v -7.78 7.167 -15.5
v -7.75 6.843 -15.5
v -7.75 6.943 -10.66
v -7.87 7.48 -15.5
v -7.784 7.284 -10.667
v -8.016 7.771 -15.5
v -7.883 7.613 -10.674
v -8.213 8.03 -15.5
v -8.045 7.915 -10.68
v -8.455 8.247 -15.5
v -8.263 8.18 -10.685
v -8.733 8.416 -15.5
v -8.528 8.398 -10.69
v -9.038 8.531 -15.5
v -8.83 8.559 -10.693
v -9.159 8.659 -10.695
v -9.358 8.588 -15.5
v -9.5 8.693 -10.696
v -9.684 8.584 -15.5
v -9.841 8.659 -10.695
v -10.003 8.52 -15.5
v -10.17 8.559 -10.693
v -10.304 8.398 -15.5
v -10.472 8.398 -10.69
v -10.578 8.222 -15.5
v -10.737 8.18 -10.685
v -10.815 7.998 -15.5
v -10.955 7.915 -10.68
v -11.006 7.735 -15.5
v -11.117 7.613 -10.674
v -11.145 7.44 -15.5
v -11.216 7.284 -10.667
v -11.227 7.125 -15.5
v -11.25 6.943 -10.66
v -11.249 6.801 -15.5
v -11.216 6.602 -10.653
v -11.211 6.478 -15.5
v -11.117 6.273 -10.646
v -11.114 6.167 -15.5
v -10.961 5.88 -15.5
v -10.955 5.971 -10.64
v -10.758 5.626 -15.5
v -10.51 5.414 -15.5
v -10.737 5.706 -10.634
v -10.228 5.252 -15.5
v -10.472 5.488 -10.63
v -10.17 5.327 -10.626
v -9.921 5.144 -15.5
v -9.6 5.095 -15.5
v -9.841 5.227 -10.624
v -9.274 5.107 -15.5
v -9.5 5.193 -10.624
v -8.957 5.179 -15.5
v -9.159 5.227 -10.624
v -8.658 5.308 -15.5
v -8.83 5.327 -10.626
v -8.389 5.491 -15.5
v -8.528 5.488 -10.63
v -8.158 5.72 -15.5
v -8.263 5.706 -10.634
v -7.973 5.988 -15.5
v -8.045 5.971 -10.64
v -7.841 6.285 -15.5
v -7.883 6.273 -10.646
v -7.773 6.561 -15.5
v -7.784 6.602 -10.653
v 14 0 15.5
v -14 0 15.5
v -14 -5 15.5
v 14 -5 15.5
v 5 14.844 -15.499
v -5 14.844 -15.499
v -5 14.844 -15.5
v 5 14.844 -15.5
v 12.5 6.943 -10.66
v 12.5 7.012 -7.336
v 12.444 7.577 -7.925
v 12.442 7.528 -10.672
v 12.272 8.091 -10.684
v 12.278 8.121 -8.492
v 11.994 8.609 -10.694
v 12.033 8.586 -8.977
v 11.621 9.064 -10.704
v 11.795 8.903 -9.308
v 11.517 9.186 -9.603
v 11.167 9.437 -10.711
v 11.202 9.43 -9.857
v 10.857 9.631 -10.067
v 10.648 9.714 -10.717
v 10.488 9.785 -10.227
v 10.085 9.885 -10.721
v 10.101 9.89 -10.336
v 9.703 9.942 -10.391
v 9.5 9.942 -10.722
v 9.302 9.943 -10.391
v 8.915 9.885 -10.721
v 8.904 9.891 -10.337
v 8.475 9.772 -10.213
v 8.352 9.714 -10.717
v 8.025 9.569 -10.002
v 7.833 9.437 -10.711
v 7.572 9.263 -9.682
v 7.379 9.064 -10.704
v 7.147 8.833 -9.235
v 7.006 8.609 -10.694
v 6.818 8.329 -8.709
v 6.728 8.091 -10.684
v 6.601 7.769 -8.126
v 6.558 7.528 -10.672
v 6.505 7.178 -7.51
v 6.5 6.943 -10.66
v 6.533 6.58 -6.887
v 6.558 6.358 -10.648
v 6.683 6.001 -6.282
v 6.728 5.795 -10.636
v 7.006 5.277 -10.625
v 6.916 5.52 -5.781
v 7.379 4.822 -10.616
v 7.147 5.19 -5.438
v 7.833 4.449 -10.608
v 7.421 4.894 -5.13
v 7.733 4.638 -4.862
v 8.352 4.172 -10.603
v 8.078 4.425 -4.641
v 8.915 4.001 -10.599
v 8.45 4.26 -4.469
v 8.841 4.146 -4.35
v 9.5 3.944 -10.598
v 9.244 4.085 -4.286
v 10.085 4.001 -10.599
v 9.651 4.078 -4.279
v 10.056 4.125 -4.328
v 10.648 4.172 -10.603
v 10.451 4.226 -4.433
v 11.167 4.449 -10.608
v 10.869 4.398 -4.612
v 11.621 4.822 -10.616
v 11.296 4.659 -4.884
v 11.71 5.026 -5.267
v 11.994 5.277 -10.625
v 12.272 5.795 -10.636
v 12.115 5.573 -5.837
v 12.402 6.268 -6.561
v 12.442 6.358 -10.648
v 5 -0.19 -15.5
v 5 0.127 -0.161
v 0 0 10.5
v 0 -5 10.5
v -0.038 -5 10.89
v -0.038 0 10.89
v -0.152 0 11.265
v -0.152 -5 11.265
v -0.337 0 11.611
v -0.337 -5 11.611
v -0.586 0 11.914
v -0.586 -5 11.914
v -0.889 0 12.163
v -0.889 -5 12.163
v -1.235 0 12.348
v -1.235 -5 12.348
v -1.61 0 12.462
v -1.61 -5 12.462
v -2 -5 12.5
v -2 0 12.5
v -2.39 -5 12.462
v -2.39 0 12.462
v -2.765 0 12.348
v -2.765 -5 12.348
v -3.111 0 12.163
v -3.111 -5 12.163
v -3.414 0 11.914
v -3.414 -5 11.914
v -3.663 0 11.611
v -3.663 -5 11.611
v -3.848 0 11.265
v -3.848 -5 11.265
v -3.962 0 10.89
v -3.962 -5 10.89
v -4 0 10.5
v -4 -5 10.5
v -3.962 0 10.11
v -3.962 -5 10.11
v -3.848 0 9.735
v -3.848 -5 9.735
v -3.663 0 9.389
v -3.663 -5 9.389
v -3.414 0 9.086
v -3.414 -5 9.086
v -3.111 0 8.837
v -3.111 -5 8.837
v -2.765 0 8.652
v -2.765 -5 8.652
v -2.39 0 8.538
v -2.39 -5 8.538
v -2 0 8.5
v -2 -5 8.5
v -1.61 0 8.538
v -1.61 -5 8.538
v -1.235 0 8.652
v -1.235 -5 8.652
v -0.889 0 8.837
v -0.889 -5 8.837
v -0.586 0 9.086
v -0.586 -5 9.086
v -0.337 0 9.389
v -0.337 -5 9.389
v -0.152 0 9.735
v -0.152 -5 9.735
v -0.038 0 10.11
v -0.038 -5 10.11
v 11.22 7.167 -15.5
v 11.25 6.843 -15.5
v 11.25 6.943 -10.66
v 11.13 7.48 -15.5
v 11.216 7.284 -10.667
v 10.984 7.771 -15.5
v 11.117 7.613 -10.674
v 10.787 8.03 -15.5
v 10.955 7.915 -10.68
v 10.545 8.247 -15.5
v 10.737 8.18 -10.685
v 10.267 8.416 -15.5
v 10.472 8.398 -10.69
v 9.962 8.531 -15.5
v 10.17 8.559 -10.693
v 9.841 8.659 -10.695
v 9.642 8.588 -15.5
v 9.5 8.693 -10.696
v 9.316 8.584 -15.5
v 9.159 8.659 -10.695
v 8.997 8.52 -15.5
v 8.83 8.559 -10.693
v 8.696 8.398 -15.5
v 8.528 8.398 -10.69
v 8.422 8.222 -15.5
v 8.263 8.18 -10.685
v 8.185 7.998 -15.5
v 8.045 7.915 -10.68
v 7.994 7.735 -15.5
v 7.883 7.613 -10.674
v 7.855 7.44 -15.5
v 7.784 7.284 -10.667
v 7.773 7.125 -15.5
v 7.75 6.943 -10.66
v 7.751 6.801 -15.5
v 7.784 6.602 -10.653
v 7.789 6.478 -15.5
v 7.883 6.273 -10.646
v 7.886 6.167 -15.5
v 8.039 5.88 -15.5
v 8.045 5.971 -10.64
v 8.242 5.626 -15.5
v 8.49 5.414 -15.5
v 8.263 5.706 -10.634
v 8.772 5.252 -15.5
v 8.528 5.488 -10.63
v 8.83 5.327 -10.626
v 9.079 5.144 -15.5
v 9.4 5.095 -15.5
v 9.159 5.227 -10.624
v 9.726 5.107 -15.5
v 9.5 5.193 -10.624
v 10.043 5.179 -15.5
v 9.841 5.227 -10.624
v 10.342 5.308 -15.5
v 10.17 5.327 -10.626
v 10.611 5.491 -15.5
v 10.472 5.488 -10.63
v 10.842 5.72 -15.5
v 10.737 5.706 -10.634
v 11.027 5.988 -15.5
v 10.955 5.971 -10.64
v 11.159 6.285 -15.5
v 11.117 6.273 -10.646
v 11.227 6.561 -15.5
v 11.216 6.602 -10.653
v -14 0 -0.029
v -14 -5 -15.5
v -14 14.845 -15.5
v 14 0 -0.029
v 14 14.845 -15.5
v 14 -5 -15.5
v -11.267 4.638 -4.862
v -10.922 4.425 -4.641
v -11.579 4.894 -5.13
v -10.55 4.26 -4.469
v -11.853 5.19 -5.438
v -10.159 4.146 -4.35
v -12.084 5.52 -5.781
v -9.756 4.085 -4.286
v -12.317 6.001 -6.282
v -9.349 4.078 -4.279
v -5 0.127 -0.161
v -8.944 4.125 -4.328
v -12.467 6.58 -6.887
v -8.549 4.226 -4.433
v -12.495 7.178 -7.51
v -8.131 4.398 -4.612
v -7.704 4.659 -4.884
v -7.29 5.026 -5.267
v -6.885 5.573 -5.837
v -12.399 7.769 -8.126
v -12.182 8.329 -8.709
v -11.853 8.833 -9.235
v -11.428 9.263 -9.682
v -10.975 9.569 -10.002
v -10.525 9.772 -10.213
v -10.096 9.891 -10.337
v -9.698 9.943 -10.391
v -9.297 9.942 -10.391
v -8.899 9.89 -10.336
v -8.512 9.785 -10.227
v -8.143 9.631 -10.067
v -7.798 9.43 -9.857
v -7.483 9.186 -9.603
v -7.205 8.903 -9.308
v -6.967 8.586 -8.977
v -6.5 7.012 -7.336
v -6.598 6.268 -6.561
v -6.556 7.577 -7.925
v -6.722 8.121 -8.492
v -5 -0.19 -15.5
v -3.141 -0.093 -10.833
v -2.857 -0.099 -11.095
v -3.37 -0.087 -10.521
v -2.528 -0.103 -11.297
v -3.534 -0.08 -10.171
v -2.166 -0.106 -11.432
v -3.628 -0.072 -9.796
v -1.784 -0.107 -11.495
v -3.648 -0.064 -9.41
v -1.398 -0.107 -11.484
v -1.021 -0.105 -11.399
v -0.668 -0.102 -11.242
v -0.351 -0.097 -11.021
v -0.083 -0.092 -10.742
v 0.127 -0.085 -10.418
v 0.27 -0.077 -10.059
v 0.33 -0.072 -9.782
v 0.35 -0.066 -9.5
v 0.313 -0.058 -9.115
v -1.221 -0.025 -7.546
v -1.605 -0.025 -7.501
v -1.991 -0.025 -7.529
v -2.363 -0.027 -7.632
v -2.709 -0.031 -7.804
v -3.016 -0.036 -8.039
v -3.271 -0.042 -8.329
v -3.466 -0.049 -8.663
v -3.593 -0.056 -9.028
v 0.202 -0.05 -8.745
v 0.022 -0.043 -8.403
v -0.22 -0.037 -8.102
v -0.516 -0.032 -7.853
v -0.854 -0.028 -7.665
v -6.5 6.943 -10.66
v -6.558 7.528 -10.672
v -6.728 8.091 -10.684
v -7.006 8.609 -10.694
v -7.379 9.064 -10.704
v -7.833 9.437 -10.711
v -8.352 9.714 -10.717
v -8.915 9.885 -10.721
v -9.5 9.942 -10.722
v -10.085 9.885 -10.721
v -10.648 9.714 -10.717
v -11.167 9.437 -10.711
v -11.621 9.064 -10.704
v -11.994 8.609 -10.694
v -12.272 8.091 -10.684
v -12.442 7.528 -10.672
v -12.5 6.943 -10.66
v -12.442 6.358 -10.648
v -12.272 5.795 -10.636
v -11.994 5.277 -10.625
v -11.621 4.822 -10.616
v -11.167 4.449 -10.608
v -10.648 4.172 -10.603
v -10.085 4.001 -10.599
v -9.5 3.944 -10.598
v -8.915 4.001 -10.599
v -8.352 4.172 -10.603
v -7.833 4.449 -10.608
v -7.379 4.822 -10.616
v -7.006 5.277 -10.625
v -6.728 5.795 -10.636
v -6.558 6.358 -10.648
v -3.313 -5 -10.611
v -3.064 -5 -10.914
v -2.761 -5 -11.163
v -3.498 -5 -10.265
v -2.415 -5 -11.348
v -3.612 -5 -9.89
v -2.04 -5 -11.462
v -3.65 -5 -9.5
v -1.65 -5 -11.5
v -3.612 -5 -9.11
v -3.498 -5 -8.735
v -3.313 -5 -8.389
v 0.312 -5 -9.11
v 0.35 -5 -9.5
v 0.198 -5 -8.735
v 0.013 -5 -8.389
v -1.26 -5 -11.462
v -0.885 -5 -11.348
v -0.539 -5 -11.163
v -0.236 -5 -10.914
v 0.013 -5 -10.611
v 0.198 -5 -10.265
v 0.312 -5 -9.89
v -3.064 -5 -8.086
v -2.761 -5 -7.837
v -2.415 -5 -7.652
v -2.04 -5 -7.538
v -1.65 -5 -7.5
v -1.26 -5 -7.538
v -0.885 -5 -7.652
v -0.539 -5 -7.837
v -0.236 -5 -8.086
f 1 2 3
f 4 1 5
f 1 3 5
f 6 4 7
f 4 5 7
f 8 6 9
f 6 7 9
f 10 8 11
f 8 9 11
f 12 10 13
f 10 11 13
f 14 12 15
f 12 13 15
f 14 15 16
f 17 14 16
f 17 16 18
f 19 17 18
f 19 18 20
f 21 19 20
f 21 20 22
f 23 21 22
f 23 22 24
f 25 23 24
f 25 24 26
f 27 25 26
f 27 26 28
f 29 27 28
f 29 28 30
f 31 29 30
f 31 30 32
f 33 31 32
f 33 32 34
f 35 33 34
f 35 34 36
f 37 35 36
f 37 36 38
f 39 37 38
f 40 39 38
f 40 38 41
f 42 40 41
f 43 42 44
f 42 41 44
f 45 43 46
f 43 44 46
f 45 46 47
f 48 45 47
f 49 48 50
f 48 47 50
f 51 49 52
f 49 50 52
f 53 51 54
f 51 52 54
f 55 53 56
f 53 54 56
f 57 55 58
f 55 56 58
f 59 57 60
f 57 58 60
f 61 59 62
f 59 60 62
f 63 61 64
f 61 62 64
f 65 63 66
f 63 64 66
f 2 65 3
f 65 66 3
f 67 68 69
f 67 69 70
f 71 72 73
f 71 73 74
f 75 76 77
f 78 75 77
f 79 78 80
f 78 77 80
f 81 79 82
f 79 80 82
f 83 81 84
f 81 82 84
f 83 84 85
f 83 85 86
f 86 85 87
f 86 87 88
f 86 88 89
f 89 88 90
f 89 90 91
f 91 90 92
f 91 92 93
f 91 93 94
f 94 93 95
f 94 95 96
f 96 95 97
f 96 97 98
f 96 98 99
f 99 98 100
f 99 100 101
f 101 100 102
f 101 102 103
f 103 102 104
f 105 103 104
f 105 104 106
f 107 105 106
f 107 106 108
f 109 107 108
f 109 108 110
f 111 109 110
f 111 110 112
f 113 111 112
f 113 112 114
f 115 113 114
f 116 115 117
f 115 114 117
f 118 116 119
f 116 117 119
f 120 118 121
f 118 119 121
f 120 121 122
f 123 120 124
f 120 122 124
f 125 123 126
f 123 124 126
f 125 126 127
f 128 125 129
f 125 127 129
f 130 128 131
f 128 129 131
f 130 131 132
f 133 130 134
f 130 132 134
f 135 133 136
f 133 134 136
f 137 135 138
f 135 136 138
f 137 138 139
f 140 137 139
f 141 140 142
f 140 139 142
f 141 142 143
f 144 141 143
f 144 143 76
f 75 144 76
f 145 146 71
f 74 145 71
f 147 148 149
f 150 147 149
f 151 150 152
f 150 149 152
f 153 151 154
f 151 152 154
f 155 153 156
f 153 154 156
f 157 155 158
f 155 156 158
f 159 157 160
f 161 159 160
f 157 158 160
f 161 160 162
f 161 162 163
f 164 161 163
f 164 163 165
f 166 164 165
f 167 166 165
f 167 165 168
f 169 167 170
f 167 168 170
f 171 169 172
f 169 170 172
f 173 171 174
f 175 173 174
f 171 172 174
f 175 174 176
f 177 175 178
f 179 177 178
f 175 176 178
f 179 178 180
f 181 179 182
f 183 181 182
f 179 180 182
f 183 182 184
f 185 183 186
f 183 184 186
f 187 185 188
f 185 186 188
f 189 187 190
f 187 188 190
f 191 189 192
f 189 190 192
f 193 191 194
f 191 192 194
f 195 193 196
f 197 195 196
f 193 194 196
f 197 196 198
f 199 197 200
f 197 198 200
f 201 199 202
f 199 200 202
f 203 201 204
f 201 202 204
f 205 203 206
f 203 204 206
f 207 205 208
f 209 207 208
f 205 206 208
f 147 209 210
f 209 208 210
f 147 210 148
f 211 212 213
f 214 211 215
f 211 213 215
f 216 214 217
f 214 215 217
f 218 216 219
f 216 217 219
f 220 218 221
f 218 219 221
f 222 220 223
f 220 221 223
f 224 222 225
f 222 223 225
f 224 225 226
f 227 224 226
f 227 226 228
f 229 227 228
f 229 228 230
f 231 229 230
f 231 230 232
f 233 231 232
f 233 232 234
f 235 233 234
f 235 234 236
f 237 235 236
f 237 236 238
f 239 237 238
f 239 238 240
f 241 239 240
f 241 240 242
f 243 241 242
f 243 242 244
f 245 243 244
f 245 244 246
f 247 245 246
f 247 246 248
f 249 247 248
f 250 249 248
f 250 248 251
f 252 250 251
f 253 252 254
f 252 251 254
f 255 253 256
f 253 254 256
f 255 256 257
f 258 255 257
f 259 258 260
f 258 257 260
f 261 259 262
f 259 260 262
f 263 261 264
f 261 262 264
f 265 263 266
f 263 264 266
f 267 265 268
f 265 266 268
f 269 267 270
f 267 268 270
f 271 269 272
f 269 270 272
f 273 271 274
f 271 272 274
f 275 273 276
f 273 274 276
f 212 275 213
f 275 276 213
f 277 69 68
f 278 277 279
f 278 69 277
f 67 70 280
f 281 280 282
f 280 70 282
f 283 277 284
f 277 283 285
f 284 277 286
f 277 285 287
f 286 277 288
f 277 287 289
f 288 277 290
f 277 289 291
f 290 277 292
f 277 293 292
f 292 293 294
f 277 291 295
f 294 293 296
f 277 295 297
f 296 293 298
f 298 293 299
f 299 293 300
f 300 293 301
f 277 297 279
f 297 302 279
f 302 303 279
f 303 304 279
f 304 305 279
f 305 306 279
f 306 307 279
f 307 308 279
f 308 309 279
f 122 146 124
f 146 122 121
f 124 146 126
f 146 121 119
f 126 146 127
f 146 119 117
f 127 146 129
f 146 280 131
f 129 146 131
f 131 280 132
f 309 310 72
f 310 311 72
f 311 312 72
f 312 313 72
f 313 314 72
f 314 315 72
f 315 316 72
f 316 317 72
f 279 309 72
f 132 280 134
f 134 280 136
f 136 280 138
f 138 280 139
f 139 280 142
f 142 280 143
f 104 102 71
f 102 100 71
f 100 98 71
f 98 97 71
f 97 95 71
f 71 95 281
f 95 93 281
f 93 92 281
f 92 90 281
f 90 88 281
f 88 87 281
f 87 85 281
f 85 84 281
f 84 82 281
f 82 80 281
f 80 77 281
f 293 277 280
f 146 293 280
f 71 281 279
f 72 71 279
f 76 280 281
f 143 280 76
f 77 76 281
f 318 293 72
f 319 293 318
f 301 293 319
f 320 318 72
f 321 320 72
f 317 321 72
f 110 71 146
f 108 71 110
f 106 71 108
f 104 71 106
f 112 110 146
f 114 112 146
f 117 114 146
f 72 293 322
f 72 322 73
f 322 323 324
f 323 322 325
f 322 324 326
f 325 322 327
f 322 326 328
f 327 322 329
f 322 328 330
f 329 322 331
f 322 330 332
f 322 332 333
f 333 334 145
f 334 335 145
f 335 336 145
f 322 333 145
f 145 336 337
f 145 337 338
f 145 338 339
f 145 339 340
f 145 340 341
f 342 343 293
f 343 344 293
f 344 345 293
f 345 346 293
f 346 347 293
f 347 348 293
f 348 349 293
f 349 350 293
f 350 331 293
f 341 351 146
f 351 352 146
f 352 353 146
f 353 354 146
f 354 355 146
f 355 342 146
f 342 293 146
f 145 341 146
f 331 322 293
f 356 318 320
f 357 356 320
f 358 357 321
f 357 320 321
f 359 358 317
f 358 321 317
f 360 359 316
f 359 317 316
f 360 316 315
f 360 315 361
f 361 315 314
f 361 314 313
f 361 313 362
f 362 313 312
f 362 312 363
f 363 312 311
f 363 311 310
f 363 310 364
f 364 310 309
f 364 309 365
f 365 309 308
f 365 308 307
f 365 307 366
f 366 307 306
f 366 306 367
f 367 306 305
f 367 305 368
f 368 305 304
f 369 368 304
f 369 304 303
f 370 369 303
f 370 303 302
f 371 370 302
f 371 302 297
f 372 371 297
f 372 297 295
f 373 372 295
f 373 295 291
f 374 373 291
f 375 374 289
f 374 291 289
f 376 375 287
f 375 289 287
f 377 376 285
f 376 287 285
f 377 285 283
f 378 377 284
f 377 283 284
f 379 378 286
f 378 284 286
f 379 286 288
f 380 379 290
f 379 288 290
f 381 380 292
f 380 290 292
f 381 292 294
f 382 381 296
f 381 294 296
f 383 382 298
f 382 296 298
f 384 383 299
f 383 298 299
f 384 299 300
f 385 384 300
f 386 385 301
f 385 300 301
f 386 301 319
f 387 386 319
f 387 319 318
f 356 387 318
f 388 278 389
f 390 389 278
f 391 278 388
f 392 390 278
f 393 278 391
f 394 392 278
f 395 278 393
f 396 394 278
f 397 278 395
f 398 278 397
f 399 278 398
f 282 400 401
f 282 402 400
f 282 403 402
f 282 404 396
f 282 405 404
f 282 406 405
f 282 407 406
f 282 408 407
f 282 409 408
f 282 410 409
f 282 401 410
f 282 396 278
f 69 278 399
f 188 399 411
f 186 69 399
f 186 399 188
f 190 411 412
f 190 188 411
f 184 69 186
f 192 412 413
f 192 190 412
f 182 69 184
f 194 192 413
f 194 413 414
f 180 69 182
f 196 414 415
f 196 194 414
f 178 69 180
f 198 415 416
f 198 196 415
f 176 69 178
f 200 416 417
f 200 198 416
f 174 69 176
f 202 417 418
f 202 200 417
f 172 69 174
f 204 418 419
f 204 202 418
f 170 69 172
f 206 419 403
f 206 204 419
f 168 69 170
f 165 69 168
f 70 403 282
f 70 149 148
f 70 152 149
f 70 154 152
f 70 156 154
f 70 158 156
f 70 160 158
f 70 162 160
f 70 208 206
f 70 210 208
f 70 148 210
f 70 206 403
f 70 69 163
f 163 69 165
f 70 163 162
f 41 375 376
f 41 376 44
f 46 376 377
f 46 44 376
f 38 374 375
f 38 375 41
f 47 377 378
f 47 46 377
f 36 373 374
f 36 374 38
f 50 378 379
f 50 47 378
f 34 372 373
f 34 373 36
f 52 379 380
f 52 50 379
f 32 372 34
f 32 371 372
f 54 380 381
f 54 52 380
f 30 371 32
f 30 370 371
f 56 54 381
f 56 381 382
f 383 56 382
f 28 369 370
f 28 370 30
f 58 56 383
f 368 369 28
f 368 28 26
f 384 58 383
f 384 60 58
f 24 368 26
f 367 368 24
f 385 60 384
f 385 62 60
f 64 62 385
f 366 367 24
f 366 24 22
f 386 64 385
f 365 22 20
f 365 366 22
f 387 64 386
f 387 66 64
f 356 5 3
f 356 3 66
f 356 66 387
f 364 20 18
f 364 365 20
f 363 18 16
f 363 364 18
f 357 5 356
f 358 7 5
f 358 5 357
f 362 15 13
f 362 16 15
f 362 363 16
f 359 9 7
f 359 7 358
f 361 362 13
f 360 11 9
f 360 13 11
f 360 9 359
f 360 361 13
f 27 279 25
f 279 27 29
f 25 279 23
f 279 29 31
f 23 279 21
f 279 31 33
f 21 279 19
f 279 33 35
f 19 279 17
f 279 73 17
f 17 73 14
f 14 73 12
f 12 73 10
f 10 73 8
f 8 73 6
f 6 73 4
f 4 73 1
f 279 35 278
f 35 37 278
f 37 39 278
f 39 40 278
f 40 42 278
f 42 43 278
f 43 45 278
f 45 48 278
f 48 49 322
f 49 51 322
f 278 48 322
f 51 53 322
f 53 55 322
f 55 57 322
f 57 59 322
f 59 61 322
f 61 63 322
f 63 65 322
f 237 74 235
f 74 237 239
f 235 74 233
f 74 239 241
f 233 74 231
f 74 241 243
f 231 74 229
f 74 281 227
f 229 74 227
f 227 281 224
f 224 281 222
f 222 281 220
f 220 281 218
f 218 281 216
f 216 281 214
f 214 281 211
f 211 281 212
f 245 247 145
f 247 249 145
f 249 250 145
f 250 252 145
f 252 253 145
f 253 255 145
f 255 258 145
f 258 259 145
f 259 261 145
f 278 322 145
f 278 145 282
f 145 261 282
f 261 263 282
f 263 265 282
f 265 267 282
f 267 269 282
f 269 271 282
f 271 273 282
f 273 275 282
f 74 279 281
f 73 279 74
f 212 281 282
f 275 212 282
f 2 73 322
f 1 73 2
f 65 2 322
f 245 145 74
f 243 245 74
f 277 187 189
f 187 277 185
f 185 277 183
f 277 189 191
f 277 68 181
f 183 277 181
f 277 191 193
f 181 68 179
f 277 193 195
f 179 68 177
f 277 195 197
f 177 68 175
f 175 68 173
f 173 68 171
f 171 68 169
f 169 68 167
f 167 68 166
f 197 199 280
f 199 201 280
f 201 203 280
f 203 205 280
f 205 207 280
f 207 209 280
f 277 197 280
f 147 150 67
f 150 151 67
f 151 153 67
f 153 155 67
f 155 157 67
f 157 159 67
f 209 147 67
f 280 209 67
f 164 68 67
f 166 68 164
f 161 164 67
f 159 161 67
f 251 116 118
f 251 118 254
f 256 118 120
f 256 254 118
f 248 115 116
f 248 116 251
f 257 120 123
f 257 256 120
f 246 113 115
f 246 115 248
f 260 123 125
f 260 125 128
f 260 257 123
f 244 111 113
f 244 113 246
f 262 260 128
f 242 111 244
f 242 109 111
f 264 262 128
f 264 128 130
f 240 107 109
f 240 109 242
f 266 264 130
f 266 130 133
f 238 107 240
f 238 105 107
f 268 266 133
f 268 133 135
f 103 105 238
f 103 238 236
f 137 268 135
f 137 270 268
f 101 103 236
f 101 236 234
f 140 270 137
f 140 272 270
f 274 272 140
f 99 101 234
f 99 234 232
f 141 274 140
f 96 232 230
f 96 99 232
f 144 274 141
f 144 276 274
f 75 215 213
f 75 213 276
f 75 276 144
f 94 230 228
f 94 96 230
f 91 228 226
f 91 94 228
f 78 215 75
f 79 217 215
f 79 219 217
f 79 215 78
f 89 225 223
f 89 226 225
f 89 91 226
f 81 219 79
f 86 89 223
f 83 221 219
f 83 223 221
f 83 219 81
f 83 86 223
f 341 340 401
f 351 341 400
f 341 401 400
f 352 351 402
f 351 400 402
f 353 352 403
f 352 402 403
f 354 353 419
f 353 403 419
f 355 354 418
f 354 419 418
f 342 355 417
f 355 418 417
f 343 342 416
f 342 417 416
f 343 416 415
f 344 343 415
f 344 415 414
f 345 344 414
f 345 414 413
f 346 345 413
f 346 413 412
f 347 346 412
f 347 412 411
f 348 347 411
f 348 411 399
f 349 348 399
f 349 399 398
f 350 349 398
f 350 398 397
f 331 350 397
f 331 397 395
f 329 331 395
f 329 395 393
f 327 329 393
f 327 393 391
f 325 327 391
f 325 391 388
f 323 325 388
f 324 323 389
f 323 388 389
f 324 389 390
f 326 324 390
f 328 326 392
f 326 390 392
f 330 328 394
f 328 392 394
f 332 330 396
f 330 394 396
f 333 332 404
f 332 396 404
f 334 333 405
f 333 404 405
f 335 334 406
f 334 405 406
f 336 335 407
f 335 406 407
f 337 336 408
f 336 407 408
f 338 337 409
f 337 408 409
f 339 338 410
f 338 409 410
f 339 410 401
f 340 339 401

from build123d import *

# Parameters (mm, degrees)
SKETCH_W        = 28
SKETCH_H        = 31
PAD_DEPTH       = 5
PAD001_DEPTH    = 28
SKETCH003_W     = 10
SKETCH003_H     = 15.030744
POCKET001_DEPTH = 15.586957
SKETCH005_R     = 3
POCKET_DEPTH    = 10.5
SKETCH006_R     = 1.75
POCKET003_DEPTH = 15.586957
SKETCH007_R     = 2
POCKET004_DEPTH = 5


with BuildPart() as part:
    # Sketch → Pad (new body)
    with BuildSketch(Plane.XZ):
        Rectangle(SKETCH_W, SKETCH_H)
    extrude(amount=PAD_DEPTH)

    # Sketch002 → Pad001 (join)
    with BuildSketch(Plane(origin=(14, 0, 0), x_dir=(0, 0, 1), z_dir=(1, 0, 0))):
        Polygon((-15.5, 0), (-0.028702, 0), (-15.5, -14.844726), align=None)
    extrude(amount=-PAD001_DEPTH)

    # Sketch003 (on DatumPlane) → Pocket001 (cut, through all)
    with BuildSketch(Plane(origin=(0, -0.014339, -0.013758), x_dir=(1, 0, 0), z_dir=(0, 0.020664, 0.999786))):
        with Locations((0, 7.659873)):
            Rectangle(SKETCH003_W, SKETCH003_H)
    extrude(amount=-POCKET001_DEPTH, mode=Mode.SUBTRACT)

    # Sketch005 (on DatumPlane) → Pocket (cut)
    with BuildSketch(Plane(origin=(0, -0.014339, -0.013758), x_dir=(1, 0, 0), z_dir=(0, 0.020664, 0.999786))):
        with Locations((-9.5, 7.175894)):
            Circle(SKETCH005_R)
        with Locations((9.5, 7.175894)):
            Circle(SKETCH005_R)
    extrude(amount=-POCKET_DEPTH, mode=Mode.SUBTRACT)

    # Sketch006 (on DatumPlane) → Pocket003 (cut, through all)
    with BuildSketch(Plane(origin=(0, -0.014339, -0.013758), x_dir=(1, 0, 0), z_dir=(0, 0.020664, 0.999786))):
        with Locations((-9.5, 7.175894)):
            Circle(SKETCH006_R)
        with Locations((9.5, 7.175894)):
            Circle(SKETCH006_R)
    extrude(amount=-POCKET003_DEPTH, mode=Mode.SUBTRACT)

    # Sketch007 (on DatumPlane) → Pocket004 (cut)
    with BuildSketch(Plane.XZ.offset(5)):
        with Locations((-1.65, -9.5)):
            Circle(SKETCH007_R)
        with Locations((-2, 10.5)):
            Circle(SKETCH007_R)
    extrude(amount=-POCKET004_DEPTH, mode=Mode.SUBTRACT)


solid = part.part
